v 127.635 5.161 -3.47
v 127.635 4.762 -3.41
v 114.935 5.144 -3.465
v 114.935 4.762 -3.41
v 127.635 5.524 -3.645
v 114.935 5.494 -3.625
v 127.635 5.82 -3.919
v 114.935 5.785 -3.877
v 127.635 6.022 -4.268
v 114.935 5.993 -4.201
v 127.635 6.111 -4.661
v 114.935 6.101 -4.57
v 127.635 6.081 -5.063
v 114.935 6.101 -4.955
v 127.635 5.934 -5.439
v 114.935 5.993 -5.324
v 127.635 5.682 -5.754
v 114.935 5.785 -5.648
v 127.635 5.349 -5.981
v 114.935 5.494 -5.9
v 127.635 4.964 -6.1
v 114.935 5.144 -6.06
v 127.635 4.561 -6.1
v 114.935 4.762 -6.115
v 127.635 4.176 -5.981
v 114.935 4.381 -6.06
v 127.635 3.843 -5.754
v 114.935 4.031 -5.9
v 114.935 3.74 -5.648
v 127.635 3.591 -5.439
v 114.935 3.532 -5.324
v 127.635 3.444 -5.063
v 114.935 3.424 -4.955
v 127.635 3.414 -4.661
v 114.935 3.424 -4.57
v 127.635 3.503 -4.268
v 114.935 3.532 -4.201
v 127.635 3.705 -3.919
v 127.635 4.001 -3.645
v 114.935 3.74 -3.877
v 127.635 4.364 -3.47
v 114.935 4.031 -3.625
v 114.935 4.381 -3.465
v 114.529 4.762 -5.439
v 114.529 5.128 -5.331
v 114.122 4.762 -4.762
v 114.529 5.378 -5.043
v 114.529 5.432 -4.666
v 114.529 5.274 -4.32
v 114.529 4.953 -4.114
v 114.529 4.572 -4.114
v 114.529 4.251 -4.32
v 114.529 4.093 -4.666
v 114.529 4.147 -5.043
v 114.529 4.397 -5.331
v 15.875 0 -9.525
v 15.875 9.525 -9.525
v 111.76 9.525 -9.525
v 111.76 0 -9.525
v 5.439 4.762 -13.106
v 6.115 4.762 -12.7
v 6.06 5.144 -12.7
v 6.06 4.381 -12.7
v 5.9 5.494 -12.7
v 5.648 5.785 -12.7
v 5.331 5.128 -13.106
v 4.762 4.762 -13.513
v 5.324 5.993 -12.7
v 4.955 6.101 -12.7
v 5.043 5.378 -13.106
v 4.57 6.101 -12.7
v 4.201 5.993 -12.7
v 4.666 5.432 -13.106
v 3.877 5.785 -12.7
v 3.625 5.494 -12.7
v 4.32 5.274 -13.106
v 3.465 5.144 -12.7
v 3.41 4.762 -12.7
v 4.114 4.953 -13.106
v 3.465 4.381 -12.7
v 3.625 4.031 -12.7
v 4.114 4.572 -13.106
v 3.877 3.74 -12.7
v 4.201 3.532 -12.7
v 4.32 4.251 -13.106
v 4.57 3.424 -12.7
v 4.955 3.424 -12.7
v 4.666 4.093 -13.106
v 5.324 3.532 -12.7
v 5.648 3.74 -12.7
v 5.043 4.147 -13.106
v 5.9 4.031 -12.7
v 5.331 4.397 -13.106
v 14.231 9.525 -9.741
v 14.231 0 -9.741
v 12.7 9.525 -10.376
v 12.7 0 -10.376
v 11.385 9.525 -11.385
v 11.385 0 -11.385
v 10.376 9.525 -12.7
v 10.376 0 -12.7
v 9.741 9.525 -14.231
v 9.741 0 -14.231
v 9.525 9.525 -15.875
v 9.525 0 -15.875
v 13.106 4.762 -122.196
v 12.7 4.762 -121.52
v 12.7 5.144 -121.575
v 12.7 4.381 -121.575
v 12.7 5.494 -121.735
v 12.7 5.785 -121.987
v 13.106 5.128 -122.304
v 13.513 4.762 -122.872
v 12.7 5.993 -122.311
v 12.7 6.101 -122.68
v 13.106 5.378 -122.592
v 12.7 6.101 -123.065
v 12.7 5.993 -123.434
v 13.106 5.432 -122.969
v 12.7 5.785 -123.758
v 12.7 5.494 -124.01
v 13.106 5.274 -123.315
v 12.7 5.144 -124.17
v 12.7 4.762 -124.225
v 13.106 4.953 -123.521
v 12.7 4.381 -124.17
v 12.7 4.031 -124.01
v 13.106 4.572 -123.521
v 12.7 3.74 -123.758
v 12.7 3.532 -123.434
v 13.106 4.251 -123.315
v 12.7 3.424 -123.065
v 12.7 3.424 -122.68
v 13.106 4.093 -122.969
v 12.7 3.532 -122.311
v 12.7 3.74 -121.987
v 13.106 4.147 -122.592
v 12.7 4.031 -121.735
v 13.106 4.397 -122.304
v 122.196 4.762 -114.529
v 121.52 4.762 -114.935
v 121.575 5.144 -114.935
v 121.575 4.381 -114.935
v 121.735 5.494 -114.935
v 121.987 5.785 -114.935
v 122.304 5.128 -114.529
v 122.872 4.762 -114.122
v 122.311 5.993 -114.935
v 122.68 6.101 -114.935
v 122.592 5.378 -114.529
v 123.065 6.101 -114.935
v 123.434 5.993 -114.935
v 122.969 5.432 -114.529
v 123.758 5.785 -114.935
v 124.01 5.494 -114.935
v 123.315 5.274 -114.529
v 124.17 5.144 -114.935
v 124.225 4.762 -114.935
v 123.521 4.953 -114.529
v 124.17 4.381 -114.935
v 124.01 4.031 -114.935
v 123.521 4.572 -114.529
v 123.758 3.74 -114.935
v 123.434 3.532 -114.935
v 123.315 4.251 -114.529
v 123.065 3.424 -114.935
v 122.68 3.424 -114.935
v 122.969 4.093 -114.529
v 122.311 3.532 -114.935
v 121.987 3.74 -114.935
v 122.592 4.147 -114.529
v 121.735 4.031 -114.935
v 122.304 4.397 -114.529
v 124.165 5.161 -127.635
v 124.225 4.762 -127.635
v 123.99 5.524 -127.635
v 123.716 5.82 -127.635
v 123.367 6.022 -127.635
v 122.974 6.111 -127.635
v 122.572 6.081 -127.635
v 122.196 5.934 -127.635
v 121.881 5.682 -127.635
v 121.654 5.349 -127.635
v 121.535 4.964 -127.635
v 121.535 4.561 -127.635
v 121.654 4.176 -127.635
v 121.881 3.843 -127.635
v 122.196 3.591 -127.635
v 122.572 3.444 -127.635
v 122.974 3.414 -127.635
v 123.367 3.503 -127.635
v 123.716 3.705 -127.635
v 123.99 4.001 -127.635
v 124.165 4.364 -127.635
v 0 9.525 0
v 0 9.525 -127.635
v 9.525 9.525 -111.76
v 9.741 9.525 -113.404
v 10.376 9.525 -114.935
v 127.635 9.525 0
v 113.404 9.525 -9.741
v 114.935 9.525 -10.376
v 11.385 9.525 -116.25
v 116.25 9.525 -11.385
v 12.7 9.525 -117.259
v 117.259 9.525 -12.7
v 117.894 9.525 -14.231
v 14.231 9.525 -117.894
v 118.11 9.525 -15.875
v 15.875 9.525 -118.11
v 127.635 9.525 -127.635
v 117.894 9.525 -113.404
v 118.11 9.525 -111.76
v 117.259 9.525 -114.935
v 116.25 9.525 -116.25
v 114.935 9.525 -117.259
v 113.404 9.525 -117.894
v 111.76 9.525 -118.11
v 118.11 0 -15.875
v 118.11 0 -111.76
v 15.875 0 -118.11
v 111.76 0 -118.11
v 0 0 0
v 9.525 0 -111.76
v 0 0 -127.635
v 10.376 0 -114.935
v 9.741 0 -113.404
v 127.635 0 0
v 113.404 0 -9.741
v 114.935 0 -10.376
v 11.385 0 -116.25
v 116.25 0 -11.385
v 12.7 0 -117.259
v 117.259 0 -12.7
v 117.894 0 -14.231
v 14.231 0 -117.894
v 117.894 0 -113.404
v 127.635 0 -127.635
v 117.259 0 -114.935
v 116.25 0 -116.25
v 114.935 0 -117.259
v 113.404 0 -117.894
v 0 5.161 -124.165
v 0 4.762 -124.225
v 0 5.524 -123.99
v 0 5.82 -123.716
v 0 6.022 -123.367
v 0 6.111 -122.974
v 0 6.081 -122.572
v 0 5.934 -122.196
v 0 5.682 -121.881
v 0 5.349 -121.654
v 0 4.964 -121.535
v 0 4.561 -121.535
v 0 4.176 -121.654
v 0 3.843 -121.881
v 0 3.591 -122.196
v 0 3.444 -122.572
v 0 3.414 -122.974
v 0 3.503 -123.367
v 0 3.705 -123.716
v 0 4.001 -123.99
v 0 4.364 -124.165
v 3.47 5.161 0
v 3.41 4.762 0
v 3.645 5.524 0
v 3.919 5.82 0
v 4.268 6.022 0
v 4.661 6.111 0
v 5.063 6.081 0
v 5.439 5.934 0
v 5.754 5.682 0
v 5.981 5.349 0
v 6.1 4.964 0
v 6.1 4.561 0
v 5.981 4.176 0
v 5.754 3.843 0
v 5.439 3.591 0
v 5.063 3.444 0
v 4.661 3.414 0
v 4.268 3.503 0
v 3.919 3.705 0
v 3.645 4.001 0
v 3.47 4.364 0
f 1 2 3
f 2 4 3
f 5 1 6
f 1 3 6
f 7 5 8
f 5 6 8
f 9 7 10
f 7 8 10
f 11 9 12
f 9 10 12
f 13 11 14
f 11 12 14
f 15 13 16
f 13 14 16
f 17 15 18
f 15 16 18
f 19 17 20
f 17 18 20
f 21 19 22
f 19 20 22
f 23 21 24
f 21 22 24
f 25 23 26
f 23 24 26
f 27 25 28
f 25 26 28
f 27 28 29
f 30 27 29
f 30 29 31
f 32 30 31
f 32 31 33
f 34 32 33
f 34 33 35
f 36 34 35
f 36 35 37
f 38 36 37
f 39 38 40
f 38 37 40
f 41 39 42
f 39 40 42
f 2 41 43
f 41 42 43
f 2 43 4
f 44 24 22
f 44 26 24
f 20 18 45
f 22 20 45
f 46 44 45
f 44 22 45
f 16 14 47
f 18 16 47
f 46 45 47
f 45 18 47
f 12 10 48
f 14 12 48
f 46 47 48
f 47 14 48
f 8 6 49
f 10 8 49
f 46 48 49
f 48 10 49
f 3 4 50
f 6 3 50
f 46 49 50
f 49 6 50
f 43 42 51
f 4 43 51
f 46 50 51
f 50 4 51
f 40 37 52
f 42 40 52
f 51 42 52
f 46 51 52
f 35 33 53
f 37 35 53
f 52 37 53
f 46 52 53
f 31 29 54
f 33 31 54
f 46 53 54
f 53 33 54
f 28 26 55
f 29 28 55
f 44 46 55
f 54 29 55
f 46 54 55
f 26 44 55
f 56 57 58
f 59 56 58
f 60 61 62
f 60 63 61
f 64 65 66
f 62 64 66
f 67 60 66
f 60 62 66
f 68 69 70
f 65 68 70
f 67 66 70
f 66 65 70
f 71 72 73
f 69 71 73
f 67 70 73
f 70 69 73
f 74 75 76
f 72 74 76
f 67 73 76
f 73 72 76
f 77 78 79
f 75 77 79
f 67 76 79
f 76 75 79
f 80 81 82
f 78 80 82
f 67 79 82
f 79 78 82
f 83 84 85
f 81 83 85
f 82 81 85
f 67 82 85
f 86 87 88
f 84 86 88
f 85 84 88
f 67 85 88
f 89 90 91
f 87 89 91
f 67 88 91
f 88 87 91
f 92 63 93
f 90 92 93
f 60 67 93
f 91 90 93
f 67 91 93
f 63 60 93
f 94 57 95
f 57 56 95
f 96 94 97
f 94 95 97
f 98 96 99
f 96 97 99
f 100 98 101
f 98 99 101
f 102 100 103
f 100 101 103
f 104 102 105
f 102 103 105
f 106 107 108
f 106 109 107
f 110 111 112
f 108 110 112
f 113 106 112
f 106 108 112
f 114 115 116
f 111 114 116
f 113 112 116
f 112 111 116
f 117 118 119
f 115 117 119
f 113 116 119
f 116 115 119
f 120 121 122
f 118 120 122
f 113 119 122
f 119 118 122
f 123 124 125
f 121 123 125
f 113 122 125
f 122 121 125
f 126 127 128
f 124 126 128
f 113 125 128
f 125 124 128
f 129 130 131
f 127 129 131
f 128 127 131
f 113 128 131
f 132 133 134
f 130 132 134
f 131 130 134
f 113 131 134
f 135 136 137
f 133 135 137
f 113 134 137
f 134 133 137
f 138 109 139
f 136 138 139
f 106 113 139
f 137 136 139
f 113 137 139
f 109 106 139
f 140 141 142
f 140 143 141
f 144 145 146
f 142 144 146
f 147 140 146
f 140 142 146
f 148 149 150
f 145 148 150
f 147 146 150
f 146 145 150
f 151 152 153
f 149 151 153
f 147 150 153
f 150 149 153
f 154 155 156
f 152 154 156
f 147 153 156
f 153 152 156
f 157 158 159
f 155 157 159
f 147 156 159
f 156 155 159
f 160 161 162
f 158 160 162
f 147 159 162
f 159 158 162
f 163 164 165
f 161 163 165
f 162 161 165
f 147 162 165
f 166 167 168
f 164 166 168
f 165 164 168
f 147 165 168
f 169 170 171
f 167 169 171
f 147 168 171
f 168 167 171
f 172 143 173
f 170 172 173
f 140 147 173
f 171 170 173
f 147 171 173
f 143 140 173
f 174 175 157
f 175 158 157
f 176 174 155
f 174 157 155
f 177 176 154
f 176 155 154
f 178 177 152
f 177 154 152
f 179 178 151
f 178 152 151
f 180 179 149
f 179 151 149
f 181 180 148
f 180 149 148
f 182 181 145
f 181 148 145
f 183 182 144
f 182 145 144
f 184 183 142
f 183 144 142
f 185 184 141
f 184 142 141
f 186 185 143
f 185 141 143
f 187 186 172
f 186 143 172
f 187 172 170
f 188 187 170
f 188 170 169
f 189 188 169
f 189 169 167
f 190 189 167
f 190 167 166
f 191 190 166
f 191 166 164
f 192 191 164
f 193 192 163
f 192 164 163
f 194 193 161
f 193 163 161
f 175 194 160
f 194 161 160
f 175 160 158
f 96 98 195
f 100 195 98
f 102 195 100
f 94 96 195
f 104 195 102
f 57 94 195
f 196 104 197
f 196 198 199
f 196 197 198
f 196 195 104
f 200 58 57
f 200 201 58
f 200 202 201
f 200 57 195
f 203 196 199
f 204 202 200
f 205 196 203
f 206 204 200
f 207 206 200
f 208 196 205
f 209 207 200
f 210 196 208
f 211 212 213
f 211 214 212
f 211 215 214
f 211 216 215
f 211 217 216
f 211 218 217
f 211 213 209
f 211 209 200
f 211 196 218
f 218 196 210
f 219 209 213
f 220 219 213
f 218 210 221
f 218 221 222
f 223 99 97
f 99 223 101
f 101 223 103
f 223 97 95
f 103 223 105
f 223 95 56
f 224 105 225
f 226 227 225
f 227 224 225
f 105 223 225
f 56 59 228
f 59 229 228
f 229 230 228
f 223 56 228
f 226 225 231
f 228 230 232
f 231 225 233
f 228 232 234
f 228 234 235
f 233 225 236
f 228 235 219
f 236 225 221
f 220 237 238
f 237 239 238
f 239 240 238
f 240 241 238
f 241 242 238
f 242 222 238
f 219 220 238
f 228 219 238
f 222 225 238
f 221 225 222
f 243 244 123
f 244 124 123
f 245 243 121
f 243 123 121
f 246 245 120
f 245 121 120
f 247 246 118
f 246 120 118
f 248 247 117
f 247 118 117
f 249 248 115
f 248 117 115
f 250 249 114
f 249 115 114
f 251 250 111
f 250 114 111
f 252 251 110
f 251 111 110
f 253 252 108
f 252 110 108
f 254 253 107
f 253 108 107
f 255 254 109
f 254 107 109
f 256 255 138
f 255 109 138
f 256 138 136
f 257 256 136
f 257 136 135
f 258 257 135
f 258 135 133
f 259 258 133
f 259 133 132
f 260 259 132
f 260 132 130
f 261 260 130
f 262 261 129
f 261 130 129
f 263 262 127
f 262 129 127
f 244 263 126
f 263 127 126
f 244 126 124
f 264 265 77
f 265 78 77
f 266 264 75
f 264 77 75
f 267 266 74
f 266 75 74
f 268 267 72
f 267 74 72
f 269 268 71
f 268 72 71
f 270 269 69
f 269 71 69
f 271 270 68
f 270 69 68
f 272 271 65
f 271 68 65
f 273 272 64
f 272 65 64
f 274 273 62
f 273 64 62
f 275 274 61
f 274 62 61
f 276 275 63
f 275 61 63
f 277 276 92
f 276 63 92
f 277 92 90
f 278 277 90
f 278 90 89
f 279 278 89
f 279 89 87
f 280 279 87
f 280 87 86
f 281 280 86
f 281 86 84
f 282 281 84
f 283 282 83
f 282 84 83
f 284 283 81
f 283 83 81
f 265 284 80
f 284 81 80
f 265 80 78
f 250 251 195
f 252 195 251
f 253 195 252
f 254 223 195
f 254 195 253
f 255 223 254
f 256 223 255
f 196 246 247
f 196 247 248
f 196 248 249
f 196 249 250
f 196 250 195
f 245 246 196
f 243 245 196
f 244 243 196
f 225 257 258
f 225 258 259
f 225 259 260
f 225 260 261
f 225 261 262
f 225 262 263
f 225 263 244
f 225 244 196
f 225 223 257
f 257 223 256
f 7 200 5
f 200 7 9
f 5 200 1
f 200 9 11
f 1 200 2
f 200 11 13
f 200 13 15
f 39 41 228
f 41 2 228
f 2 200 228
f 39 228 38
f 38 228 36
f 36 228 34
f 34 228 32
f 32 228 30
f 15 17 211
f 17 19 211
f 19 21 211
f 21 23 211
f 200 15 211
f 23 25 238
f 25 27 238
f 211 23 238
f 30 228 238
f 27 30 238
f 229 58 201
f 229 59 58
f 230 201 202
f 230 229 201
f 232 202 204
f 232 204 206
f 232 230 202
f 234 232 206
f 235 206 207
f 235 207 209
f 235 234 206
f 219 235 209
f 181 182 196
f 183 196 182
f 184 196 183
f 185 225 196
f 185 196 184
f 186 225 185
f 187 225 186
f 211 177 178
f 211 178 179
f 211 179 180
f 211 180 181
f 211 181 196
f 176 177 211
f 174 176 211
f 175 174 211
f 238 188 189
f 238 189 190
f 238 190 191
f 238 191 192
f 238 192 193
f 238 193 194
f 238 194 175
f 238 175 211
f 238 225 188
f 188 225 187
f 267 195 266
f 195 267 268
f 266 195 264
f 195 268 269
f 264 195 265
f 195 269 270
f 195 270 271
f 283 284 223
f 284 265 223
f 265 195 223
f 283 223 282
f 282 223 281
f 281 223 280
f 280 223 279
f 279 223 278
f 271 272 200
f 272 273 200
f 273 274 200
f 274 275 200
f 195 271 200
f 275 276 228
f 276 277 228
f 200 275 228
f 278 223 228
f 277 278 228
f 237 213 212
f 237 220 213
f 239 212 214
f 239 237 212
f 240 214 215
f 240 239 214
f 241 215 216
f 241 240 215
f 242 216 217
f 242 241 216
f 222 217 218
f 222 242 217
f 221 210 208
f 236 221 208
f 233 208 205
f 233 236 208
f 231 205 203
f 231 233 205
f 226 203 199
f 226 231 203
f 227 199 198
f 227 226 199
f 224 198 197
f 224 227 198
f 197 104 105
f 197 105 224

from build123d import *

# Parameters (mm, degrees)
SKETCH1_W                     = 127.635
SKETCH1_H                     = 127.635
BOSS_EXTRUDE1_DEPTH           = 9.525
SKETCH5_W                     = 108.585
SKETCH5_H                     = 108.585
CUT_EXTRUDE1_DEPTH            = 9.525
FILLET1_R                     = 6.35
TAP_DRILL_FOR_6_32_TAP2_D     = 2.7051
TAP_DRILL_FOR_6_32_TAP2_DEPTH = 12.7
TAP_DRILL_FOR_6_32_TAP2_TIP   = 0.81269403
TAP_DRILL_FOR_6_32_TAP3_D     = 2.7051
TAP_DRILL_FOR_6_32_TAP3_DEPTH = 12.7
TAP_DRILL_FOR_6_32_TAP3_TIP   = 0.81269403
TAP_DRILL_FOR_6_32_TAP4_D     = 2.7051
TAP_DRILL_FOR_6_32_TAP4_DEPTH = 12.7
TAP_DRILL_FOR_6_32_TAP4_TIP   = 0.81269403
TAP_DRILL_FOR_6_32_TAP5_D     = 2.7051
TAP_DRILL_FOR_6_32_TAP5_DEPTH = 12.7
TAP_DRILL_FOR_6_32_TAP5_TIP   = 0.81269403


with BuildPart() as part:
    # Sketch1 → Boss-Extrude1 (new body)
    with BuildSketch(Plane(origin=(0, 0, 0), x_dir=(1, 0, 0), z_dir=(0, 1, 0))):
        with Locations((63.8175, 63.8175)):
            Rectangle(SKETCH1_W, SKETCH1_H)
    extrude(amount=BOSS_EXTRUDE1_DEPTH)

    # Sketch5 → Cut-Extrude1 (cut)
    with BuildSketch(Plane(origin=(0, 9.525, 0), x_dir=(1, 0, 0), z_dir=(0, 1, 0))):
        with Locations((63.8175, 63.8175)):
            Rectangle(SKETCH5_W, SKETCH5_H)
    extrude(amount=-CUT_EXTRUDE1_DEPTH, mode=Mode.SUBTRACT)

    # Fillet1
    fillet1_edges = [part.edges().sort_by_distance(p)[0] for p in [
        (118.11, 4.7625, -9.525),
        (9.525, 4.7625, -9.525),
        (9.525, 4.7625, -118.11),
        (118.11, 4.7625, -118.11),
    ]]
    fillet(fillet1_edges, radius=FILLET1_R)

    # Tap Drill for #6-32 Tap2
    with Locations(Plane(origin=(127.635, 0, 0), x_dir=(0, 0, -1), z_dir=(1, 0, 0))):
        with Locations((4.7625, 4.7625)):
            Hole(TAP_DRILL_FOR_6_32_TAP2_D / 2, depth=TAP_DRILL_FOR_6_32_TAP2_DEPTH)
            with Locations((0, 0, -(TAP_DRILL_FOR_6_32_TAP2_DEPTH + TAP_DRILL_FOR_6_32_TAP2_TIP / 2))):  # 118° drill point
                Cone(0, TAP_DRILL_FOR_6_32_TAP2_D / 2, TAP_DRILL_FOR_6_32_TAP2_TIP, mode=Mode.SUBTRACT)

    # Tap Drill for #6-32 Tap3
    with Locations(Plane.XY):
        with Locations((4.7625, 4.7625)):
            Hole(TAP_DRILL_FOR_6_32_TAP3_D / 2, depth=TAP_DRILL_FOR_6_32_TAP3_DEPTH)
            with Locations((0, 0, -(TAP_DRILL_FOR_6_32_TAP3_DEPTH + TAP_DRILL_FOR_6_32_TAP3_TIP / 2))):  # 118° drill point
                Cone(0, TAP_DRILL_FOR_6_32_TAP3_D / 2, TAP_DRILL_FOR_6_32_TAP3_TIP, mode=Mode.SUBTRACT)

    # Tap Drill for #6-32 Tap4
    with Locations(Plane.ZY):
        with Locations((-122.8725, 4.7625)):
            Hole(TAP_DRILL_FOR_6_32_TAP4_D / 2, depth=TAP_DRILL_FOR_6_32_TAP4_DEPTH)
            with Locations((0, 0, -(TAP_DRILL_FOR_6_32_TAP4_DEPTH + TAP_DRILL_FOR_6_32_TAP4_TIP / 2))):  # 118° drill point
                Cone(0, TAP_DRILL_FOR_6_32_TAP4_D / 2, TAP_DRILL_FOR_6_32_TAP4_TIP, mode=Mode.SUBTRACT)

    # Tap Drill for #6-32 Tap5
    with Locations(Plane(origin=(0, 0, -127.635), x_dir=(-1, 0, 0), z_dir=(0, 0, -1))):
        with Locations((-122.8725, 4.7625)):
            Hole(TAP_DRILL_FOR_6_32_TAP5_D / 2, depth=TAP_DRILL_FOR_6_32_TAP5_DEPTH)
            with Locations((0, 0, -(TAP_DRILL_FOR_6_32_TAP5_DEPTH + TAP_DRILL_FOR_6_32_TAP5_TIP / 2))):  # 118° drill point
                Cone(0, TAP_DRILL_FOR_6_32_TAP5_D / 2, TAP_DRILL_FOR_6_32_TAP5_TIP, mode=Mode.SUBTRACT)


solid = part.part
